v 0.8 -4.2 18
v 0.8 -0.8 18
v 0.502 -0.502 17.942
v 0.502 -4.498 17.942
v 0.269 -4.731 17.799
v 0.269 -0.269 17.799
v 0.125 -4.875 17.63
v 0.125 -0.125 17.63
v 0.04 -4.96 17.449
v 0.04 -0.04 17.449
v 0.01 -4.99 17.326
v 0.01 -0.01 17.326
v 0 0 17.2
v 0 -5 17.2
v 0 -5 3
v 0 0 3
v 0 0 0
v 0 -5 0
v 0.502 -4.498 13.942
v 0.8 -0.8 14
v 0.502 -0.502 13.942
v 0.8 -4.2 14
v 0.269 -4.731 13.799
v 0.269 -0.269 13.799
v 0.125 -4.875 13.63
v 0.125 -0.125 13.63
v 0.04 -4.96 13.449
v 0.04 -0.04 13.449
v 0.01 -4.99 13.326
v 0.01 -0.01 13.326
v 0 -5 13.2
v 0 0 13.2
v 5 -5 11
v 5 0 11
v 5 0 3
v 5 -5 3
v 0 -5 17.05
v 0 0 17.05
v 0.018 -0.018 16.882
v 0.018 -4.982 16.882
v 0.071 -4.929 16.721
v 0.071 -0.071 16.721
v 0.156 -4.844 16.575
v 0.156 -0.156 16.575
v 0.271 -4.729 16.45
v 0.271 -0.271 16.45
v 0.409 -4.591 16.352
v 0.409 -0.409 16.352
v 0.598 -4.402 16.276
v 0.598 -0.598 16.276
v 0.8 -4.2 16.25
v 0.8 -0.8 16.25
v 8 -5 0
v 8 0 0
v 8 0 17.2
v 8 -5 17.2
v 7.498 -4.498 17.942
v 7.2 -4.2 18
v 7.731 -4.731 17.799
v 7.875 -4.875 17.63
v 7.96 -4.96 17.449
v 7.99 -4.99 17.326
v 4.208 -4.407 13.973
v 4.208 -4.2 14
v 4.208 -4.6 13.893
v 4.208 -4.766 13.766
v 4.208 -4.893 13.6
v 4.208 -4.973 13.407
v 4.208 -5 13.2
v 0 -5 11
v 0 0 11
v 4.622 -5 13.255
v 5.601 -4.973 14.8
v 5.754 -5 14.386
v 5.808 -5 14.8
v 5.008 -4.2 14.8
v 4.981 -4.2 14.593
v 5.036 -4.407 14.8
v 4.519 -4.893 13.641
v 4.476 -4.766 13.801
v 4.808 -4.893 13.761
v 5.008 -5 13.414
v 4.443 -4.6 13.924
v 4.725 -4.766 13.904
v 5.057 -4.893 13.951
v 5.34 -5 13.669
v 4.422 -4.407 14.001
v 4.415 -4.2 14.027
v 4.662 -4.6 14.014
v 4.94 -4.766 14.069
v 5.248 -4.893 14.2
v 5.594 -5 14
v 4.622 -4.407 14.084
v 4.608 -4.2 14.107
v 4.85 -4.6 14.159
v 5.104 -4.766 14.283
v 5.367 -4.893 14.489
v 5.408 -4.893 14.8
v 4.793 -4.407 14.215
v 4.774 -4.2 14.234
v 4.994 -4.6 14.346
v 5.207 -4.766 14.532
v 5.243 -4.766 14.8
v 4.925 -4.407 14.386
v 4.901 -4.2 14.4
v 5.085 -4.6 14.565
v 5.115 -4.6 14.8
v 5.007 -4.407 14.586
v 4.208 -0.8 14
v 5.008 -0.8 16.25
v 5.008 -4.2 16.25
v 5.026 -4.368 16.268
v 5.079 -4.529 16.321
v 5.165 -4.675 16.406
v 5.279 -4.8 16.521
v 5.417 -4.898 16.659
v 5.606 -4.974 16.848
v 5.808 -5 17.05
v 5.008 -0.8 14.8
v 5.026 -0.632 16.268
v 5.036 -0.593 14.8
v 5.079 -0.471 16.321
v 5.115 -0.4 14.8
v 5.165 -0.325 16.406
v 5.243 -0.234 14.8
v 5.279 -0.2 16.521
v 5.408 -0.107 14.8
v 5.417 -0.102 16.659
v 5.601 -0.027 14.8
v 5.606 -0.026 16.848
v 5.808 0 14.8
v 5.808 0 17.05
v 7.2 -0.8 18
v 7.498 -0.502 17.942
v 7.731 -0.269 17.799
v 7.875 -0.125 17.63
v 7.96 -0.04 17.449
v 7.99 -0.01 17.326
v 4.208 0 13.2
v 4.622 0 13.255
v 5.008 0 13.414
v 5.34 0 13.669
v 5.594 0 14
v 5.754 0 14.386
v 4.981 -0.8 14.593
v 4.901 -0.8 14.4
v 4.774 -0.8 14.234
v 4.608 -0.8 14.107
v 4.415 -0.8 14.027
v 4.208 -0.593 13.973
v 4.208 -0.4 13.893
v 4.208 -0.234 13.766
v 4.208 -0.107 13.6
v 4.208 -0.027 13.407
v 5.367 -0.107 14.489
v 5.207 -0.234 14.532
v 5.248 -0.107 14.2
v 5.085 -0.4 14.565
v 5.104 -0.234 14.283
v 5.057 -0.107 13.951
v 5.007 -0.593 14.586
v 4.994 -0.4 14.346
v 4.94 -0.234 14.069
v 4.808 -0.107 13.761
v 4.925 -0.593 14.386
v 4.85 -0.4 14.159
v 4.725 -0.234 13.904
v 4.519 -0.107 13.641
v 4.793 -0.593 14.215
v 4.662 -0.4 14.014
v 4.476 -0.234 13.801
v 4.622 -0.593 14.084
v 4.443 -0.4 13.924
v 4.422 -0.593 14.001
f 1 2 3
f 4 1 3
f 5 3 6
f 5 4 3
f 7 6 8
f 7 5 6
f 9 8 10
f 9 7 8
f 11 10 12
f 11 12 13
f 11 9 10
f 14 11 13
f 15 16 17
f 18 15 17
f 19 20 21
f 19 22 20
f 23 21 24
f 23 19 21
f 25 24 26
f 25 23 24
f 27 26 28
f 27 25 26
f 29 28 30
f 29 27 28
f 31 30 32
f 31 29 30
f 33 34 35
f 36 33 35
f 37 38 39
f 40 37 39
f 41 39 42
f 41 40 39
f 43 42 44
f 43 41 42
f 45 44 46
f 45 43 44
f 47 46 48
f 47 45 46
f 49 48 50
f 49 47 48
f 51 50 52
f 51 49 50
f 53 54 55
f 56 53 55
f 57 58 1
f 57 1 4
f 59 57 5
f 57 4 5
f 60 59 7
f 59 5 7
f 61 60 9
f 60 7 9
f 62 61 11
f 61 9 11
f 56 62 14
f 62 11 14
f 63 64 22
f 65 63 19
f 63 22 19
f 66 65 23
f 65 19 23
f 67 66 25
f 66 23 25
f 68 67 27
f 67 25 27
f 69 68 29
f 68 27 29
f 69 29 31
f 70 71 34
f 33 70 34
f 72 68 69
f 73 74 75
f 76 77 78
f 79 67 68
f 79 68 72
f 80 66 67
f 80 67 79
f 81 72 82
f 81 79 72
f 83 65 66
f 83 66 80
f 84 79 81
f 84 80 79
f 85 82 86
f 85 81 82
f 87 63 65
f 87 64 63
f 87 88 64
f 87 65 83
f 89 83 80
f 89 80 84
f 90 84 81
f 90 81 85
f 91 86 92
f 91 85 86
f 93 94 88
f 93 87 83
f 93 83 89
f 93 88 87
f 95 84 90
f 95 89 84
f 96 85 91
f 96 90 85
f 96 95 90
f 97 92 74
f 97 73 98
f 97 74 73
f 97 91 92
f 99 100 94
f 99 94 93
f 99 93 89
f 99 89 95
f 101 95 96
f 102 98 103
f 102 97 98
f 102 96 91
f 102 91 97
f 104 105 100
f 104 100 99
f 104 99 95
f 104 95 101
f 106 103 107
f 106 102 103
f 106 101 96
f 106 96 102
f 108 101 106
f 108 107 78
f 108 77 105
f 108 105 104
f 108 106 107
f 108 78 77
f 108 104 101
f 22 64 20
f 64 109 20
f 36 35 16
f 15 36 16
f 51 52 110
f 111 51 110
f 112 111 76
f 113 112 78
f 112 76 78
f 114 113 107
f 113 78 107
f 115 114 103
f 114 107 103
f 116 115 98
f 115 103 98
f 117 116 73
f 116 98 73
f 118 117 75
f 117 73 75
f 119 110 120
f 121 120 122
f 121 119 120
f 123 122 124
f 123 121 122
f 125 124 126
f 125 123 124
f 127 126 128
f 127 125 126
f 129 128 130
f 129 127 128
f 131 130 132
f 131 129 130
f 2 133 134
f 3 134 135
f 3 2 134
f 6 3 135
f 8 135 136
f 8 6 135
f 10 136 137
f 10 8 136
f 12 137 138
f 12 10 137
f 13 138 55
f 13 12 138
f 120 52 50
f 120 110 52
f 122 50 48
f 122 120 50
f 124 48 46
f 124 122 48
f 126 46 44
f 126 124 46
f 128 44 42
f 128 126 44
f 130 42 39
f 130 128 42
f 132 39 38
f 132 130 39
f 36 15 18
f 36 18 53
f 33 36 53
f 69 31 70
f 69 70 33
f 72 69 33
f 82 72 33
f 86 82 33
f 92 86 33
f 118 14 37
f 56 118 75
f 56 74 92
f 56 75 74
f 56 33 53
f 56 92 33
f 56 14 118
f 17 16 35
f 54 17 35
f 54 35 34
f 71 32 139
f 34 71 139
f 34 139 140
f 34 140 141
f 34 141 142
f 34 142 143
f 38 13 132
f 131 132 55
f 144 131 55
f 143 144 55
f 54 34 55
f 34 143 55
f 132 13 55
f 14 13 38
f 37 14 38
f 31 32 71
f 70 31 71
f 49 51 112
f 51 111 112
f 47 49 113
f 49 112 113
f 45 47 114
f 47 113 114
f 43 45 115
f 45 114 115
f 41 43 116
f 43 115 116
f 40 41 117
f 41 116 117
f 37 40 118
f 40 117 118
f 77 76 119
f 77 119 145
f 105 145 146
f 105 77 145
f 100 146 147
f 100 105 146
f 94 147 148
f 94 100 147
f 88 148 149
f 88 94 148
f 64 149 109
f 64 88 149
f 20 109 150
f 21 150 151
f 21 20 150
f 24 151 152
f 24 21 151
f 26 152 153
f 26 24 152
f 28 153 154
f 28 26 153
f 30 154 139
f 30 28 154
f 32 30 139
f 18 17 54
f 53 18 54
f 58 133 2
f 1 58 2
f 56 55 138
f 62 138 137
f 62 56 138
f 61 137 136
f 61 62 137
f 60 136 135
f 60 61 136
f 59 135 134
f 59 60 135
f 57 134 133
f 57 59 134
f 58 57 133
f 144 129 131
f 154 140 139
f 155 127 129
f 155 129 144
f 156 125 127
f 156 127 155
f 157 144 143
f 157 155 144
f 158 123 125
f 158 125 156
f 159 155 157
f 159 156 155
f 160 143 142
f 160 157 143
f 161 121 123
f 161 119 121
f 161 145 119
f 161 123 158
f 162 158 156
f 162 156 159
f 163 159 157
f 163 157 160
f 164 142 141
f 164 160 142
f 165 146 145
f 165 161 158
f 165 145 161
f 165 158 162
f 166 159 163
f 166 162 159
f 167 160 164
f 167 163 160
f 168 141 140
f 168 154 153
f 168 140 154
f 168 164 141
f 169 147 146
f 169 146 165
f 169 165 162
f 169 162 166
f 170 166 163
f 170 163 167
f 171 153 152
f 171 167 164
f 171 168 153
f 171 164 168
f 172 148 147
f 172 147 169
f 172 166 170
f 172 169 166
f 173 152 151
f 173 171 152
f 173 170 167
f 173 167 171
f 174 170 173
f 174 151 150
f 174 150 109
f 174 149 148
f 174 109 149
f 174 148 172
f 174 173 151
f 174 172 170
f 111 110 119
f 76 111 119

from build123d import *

# Parameters (mm, degrees)
F1_DEPTH = 5
F2_R     = 0.8


with BuildPart() as f1:
    # F0 (on Front) → F1 (new body)
    with BuildSketch(Plane.XZ):
        Polygon((0, 3), (0, 0), (8, 0), (8, 18), (0, 18), (0, 16.25), (5.0083114872, 16.25), (5.0083114872, 14), (0, 14), (0, 11), (5, 11), (5, 3), align=None)
    extrude(amount=F1_DEPTH)

    # F2
    f2_edges = [f1.edges().sort_by_distance(p)[0] for p in [
        (0, -2.5, 18),
        (0, -2.5, 16.25),
        (2.504156, -5, 14),
        (5.008311, -5, 15.125),
        (5.008311, 0, 15.125),
        (2.504156, -5, 16.25),
        (2.504156, 0, 14),
        (2.504156, 0, 16.25),
        (4, 0, 18),
        (4, -5, 18),
        (8, -2.5, 18),
        (5.008311, -2.5, 14),
        (0, -2.5, 14),
    ]]
    fillet(f2_edges, radius=F2_R)


solid = f1.part
